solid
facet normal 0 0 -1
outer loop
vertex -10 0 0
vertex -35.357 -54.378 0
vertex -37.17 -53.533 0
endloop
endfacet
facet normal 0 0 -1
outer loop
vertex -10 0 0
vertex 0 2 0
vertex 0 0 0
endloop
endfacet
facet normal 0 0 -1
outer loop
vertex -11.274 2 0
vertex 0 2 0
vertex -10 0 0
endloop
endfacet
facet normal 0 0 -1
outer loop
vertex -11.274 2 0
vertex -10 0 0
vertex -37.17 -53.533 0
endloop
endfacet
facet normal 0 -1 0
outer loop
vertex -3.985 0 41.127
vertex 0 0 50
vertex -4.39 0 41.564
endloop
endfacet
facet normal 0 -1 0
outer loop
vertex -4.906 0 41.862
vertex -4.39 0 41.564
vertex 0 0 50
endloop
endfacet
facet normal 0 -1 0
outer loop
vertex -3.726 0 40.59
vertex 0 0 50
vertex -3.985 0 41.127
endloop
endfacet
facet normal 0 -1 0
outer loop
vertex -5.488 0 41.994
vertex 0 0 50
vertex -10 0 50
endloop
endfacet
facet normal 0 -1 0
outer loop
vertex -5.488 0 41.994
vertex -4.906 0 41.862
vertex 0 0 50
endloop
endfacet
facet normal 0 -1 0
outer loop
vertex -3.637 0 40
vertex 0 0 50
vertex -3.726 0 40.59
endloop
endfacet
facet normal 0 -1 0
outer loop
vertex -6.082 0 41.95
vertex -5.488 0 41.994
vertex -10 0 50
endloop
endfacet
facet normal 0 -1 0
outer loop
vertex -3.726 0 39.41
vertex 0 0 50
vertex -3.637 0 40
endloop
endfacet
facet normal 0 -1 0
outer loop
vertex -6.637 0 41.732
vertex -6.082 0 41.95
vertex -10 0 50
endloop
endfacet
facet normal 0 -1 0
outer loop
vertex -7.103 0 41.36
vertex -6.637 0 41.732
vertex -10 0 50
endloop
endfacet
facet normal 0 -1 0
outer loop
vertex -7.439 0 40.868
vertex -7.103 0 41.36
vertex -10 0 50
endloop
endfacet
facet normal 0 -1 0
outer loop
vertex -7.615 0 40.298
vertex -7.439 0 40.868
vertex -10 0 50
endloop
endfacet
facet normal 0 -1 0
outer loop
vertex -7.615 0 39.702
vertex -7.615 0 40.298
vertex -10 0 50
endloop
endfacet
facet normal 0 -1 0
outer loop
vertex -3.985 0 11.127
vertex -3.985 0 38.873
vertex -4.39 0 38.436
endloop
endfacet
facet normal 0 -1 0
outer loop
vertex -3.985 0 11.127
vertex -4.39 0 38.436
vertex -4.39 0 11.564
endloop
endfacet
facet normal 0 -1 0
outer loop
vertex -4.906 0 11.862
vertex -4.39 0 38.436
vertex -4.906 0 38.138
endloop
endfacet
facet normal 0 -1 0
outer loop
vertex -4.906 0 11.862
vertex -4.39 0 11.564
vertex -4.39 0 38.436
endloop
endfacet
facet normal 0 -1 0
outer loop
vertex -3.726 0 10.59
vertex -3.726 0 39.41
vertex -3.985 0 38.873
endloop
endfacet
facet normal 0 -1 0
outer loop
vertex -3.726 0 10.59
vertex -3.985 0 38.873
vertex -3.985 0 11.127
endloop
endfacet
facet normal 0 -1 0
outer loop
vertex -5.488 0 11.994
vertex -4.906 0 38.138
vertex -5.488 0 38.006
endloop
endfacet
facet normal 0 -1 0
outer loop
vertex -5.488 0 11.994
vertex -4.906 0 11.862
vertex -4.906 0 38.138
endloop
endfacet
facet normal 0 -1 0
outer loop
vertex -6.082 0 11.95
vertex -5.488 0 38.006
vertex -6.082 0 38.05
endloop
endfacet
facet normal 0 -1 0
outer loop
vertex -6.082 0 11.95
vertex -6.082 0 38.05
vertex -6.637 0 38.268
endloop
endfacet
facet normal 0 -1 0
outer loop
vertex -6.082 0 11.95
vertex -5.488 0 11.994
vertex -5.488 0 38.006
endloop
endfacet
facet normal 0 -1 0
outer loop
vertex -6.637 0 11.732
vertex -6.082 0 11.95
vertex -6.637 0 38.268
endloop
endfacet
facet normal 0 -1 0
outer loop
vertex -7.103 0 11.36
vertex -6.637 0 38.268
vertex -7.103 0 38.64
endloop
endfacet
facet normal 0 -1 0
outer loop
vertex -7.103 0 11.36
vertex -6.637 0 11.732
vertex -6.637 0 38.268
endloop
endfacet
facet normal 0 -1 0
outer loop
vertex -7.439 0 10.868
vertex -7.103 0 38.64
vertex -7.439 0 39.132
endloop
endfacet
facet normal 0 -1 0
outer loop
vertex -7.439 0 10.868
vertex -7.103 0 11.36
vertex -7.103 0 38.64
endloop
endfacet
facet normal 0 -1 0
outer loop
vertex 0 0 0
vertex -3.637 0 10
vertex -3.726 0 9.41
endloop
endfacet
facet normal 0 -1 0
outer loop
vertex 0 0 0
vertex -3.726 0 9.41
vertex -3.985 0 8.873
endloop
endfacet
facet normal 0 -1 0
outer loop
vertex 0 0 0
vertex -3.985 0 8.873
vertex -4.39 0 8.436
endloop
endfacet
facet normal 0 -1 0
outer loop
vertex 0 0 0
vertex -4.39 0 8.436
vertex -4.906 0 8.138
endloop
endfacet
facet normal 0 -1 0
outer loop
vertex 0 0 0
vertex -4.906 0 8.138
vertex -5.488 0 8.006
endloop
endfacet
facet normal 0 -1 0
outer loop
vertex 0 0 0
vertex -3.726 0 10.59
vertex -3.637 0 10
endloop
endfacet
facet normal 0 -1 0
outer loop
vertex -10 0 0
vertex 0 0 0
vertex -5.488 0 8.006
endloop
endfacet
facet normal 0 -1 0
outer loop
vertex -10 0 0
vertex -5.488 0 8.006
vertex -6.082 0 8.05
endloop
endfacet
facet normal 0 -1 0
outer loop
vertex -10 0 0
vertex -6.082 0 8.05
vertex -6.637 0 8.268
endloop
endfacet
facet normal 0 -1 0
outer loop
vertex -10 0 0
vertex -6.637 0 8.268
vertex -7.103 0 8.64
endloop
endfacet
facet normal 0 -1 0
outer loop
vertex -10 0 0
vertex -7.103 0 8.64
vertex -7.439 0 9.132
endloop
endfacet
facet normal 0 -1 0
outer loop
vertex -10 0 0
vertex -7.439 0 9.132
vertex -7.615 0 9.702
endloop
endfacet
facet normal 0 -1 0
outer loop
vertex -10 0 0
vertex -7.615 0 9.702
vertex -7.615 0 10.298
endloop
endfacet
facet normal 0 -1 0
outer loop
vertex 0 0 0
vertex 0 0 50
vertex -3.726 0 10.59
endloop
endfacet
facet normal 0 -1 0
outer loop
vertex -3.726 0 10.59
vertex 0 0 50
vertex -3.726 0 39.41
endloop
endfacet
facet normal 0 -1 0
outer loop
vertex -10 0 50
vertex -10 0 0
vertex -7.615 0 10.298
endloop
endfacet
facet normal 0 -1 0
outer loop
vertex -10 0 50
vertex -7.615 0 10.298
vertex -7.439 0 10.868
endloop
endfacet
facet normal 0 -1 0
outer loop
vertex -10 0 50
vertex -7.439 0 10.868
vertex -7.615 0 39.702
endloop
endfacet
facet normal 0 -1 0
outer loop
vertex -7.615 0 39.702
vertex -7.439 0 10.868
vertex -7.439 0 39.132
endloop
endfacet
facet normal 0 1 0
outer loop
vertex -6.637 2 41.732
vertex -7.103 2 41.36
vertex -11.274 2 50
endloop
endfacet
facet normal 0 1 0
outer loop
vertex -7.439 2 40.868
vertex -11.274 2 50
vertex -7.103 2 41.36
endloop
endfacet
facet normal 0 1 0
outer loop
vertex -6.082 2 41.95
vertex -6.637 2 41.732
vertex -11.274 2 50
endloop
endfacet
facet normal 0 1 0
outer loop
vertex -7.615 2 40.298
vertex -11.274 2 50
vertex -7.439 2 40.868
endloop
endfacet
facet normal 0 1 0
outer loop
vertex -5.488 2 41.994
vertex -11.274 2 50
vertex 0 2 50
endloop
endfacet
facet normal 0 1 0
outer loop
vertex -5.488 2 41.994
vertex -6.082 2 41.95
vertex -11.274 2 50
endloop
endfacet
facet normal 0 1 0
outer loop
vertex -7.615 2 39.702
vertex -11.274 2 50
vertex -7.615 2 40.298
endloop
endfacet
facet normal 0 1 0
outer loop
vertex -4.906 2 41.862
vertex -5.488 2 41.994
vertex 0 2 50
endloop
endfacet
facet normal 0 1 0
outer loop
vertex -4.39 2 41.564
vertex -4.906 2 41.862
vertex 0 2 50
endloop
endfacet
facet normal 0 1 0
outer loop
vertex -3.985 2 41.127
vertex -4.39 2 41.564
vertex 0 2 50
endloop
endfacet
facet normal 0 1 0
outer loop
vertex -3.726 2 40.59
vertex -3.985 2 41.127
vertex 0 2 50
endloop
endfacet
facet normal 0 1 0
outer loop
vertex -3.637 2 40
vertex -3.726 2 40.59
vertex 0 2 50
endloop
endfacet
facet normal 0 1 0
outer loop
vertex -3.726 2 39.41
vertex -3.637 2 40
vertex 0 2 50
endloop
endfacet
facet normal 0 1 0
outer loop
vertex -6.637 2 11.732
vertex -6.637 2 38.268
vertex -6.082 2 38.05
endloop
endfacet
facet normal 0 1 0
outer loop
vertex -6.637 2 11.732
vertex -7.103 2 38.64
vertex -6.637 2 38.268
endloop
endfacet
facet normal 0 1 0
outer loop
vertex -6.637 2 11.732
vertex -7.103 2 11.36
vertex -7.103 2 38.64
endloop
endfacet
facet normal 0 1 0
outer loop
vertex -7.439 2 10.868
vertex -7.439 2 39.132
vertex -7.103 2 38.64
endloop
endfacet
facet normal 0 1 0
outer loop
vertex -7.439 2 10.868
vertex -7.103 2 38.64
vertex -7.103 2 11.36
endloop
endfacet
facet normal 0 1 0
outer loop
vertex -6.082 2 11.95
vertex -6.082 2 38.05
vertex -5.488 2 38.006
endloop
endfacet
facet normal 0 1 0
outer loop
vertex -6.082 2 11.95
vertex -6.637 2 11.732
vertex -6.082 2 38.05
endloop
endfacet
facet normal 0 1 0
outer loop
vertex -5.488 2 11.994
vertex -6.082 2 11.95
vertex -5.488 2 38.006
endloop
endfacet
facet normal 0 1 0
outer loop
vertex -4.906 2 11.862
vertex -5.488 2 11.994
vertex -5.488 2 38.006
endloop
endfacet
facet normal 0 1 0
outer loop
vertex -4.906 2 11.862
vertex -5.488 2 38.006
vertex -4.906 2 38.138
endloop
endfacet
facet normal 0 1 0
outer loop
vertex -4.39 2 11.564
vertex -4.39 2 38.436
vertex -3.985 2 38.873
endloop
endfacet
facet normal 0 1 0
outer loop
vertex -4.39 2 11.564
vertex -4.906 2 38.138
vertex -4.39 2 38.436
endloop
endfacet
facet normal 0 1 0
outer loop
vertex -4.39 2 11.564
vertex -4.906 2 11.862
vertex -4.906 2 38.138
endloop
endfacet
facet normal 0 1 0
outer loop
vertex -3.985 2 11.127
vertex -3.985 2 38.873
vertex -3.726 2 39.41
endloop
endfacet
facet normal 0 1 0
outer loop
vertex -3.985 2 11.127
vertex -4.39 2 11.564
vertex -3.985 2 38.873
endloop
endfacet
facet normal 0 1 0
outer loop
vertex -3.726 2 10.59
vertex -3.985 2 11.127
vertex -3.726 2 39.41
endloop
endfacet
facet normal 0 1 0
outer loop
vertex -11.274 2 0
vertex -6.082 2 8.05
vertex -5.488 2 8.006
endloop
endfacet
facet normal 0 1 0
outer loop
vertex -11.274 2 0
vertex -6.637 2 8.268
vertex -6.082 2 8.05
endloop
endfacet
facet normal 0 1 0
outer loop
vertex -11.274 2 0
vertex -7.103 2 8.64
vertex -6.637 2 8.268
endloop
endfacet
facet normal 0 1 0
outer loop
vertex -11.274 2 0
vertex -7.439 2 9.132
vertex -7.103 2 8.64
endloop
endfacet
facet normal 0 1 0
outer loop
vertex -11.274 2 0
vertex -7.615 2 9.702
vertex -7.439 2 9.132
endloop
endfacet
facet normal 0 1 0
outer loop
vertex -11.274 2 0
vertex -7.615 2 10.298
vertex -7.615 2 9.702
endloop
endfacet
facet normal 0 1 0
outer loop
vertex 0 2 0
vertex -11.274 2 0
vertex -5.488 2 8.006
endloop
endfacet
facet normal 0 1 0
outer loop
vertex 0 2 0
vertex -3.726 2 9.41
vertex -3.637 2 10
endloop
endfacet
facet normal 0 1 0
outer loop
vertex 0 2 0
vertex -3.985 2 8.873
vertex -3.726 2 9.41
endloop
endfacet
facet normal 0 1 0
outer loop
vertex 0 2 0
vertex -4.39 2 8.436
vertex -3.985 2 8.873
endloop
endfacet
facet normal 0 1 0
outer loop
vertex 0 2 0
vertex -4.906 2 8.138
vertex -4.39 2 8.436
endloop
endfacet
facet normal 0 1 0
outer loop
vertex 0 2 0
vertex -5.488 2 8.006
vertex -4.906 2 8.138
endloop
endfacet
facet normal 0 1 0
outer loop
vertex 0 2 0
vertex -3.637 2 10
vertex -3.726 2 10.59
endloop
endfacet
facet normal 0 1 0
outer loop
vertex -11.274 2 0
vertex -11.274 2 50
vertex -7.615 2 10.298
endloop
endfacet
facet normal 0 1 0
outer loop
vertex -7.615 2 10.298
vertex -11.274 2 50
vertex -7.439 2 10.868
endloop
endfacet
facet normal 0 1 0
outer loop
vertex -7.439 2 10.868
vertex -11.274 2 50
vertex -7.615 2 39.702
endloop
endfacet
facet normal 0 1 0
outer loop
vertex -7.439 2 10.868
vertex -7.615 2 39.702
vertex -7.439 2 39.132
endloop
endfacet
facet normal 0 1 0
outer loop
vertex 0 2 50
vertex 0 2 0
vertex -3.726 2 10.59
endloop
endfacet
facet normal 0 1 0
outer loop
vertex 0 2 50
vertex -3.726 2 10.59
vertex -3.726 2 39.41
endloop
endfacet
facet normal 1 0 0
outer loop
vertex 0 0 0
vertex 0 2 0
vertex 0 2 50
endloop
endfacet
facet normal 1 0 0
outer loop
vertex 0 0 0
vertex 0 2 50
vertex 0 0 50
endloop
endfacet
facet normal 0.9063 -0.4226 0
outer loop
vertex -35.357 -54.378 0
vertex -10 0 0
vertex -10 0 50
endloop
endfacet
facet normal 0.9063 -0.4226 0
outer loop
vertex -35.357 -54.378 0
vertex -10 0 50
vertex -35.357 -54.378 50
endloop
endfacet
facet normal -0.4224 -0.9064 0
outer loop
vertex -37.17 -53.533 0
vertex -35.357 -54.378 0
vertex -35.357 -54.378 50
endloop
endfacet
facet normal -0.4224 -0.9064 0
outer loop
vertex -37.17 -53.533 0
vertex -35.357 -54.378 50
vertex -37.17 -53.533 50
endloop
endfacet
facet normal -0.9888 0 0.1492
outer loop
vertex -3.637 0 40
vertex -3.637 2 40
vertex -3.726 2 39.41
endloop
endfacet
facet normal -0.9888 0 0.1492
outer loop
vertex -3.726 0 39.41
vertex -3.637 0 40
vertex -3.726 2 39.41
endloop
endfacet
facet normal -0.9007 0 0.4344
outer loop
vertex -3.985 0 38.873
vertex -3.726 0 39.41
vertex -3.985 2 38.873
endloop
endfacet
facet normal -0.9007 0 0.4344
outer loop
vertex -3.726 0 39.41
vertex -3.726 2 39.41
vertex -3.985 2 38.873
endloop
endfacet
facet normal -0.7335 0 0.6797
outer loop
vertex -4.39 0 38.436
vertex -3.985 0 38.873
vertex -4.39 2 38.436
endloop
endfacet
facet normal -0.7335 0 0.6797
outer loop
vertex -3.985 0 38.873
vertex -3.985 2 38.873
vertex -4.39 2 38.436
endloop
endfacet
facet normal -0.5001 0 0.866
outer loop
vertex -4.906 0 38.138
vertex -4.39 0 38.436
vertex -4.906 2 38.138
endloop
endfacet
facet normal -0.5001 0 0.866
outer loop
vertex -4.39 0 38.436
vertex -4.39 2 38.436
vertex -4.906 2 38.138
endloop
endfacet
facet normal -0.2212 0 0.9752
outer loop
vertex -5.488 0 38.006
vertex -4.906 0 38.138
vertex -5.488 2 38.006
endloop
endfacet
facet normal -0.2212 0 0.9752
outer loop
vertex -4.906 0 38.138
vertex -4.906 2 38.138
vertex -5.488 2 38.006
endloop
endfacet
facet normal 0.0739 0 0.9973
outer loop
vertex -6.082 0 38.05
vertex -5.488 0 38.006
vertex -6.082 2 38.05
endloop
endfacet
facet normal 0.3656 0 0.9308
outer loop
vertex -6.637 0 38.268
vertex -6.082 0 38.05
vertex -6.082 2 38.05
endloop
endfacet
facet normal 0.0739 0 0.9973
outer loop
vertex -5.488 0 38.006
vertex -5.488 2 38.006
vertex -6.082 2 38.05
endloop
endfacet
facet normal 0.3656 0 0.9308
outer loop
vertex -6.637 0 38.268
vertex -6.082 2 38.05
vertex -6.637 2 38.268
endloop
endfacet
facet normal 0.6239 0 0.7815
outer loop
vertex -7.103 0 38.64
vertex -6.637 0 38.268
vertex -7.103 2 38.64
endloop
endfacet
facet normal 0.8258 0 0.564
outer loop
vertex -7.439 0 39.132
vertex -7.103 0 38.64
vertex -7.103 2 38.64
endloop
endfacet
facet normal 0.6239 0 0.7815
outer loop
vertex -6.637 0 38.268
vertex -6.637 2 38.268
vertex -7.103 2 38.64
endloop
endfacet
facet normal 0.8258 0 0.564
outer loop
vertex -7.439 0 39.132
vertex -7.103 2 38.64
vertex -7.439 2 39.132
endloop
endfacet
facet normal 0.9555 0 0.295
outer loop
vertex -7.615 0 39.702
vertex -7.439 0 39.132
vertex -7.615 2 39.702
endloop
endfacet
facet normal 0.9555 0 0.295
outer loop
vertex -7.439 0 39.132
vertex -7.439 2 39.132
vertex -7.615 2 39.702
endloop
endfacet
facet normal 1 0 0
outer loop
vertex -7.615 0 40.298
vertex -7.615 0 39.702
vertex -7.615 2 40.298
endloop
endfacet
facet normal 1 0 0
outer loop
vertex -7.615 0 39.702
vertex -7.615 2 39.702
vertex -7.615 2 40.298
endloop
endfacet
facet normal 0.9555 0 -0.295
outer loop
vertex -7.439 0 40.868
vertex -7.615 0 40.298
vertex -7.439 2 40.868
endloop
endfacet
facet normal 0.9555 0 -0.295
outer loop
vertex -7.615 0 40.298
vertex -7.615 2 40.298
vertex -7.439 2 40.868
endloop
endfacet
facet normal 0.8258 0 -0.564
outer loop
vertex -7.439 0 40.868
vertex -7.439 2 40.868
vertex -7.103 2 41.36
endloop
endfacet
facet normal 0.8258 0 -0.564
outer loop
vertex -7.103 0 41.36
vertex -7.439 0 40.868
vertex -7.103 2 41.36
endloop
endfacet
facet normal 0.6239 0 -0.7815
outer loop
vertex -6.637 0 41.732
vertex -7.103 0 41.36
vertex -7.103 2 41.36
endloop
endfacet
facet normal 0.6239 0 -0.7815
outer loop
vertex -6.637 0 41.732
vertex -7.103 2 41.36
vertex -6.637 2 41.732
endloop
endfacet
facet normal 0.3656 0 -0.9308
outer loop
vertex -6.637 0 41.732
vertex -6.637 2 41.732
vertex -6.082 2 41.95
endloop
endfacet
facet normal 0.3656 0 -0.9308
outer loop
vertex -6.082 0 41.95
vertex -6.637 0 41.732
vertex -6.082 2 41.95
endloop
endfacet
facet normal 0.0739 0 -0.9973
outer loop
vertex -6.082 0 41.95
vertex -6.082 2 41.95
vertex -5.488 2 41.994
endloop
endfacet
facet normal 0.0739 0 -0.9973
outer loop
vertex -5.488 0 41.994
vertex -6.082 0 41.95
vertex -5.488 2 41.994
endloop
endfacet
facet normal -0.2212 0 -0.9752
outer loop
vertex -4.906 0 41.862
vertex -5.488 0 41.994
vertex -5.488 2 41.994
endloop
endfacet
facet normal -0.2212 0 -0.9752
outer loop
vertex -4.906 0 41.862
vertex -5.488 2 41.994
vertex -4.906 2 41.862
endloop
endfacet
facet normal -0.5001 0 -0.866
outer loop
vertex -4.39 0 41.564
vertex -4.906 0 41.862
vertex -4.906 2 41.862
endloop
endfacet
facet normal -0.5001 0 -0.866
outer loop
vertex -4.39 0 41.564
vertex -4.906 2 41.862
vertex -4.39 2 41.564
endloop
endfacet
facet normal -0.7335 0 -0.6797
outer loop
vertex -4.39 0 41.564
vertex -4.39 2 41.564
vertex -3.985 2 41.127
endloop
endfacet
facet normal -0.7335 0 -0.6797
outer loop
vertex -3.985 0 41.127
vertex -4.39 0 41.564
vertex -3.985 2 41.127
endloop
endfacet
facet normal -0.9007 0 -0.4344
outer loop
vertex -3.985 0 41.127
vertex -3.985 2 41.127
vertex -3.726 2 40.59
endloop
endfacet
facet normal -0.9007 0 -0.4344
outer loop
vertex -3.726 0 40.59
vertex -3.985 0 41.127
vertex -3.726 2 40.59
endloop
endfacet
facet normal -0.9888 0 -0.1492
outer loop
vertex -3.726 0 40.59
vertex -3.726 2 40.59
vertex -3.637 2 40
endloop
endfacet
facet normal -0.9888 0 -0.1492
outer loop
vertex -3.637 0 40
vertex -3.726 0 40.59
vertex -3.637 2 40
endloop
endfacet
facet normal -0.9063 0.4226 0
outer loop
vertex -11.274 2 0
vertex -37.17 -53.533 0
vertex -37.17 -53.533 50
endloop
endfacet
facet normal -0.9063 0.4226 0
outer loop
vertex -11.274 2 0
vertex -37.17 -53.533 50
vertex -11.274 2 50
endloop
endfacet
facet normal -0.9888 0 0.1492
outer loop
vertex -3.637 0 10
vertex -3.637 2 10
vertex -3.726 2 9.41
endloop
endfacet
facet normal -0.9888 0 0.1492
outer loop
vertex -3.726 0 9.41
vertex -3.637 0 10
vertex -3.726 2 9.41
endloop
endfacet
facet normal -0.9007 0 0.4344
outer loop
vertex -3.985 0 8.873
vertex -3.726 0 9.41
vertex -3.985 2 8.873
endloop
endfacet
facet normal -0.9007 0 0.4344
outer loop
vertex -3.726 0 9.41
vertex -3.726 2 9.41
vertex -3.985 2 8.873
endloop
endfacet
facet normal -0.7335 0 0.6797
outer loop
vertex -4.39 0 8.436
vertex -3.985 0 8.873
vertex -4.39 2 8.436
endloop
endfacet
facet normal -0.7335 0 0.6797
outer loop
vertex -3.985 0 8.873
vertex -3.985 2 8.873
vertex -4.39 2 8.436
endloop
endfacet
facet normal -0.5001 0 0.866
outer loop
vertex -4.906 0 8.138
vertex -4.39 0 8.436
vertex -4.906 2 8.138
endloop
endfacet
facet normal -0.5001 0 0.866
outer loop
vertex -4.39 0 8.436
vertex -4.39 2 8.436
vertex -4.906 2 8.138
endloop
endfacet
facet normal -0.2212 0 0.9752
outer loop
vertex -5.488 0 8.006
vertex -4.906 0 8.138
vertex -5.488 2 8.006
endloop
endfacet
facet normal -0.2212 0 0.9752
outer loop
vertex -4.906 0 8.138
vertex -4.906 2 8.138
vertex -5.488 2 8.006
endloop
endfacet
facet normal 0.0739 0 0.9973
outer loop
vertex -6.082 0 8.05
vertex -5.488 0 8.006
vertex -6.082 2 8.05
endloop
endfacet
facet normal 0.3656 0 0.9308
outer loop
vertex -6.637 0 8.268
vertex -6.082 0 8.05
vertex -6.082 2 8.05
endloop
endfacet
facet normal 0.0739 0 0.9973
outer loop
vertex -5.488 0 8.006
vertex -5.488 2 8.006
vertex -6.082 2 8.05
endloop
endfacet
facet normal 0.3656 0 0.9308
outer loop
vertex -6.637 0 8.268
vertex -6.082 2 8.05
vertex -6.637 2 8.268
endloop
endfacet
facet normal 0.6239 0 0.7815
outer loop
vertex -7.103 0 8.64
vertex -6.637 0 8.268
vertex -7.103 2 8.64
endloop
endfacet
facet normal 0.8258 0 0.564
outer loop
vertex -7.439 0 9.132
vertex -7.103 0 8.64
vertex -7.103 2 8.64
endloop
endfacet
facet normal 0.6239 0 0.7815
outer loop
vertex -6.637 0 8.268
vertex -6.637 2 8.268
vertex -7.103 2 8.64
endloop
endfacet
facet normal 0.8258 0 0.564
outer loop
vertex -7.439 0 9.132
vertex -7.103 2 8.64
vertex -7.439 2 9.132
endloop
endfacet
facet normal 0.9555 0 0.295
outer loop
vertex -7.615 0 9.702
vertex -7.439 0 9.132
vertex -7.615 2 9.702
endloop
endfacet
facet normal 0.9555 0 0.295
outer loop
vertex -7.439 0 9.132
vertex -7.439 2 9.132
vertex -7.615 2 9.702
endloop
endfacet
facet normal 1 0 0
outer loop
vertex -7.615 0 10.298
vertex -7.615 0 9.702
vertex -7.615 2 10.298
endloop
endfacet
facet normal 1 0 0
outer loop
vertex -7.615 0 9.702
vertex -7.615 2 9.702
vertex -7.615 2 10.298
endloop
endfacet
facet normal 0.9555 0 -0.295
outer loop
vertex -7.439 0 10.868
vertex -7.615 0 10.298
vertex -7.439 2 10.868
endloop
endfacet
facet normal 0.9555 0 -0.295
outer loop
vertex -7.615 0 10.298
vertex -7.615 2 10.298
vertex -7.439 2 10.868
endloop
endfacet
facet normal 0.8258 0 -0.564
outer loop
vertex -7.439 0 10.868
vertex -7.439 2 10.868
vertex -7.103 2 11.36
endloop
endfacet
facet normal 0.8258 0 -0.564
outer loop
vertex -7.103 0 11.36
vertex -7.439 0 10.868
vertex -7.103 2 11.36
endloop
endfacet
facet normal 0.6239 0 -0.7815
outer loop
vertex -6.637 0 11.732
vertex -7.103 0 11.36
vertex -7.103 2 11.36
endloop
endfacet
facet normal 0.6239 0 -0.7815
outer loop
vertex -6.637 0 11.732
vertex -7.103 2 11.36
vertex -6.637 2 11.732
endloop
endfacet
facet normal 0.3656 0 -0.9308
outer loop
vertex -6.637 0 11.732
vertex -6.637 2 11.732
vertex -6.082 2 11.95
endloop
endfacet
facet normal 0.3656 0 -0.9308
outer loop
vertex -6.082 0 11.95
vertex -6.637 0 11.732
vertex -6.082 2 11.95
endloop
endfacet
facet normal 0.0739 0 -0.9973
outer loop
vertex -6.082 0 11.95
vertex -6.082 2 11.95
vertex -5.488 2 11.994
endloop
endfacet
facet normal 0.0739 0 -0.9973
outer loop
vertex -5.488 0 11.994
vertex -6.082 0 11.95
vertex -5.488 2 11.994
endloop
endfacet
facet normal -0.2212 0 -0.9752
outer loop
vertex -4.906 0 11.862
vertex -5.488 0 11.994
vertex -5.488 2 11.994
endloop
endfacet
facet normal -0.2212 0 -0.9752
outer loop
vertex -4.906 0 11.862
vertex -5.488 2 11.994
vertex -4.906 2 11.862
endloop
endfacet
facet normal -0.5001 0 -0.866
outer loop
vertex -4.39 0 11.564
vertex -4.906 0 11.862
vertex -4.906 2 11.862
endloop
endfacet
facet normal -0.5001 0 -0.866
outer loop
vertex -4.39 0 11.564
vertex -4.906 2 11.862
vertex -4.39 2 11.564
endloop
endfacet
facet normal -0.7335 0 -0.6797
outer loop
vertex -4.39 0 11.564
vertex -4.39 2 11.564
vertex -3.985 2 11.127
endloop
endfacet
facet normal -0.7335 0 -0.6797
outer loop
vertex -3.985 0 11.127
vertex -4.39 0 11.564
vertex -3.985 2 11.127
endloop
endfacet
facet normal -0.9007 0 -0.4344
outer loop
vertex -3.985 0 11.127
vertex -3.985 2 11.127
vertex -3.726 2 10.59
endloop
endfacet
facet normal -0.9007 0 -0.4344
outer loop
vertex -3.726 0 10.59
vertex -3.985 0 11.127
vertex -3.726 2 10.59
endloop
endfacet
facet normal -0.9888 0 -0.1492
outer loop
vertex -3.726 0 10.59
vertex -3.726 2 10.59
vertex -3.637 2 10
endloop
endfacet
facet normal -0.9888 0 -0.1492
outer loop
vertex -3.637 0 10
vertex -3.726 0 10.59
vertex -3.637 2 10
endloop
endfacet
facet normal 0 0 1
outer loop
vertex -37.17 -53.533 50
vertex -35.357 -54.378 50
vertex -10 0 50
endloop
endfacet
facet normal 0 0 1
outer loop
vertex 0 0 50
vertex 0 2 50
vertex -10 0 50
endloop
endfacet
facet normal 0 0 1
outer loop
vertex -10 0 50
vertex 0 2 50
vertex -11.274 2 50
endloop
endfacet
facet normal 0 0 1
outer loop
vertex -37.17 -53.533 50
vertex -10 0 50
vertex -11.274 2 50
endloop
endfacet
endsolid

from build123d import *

# Parameters (mm, degrees)
BOSS_EXTRUDE1_DEPTH = 50
CUT_EXTRUDE1_REACH  = 58.378
SKETCH2_R           = 2


with BuildPart() as part:
    # Sketch1 → Boss-Extrude1 (new body)
    with BuildSketch(Plane.XY):
        Polygon((0, 0), (-10, 0), (-35.357095704, -54.378467222), (-37.169711279, -53.533230699), (-11.274140522, 2), (0, 2), align=None)
    extrude(amount=BOSS_EXTRUDE1_DEPTH)

    # Sketch2 → Cut-Extrude1 (cut, up to next)
    with BuildSketch(Plane(origin=(0, 2, 0), x_dir=(1, 0, 0), z_dir=(0, 1, 0)), mode=Mode.PRIVATE) as cut_extrude1_sk1:
        with Locations((-5.637070261, -10)):
            Circle(SKETCH2_R)
    cut_extrude1_tool1 = extrude(cut_extrude1_sk1.sketch, amount=-CUT_EXTRUDE1_REACH, mode=Mode.PRIVATE) & part.part
    add(cut_extrude1_tool1.solids().sort_by_distance((-5.63707, 2, 10))[0], mode=Mode.SUBTRACT)
    # Sketch2 → Cut-Extrude1 (cut, up to next)
    with BuildSketch(Plane(origin=(0, 2, 0), x_dir=(1, 0, 0), z_dir=(0, 1, 0)), mode=Mode.PRIVATE) as cut_extrude1_sk2:
        with Locations((-5.637070261, -40)):
            Circle(SKETCH2_R)
    cut_extrude1_tool2 = extrude(cut_extrude1_sk2.sketch, amount=-CUT_EXTRUDE1_REACH, mode=Mode.PRIVATE) & part.part
    add(cut_extrude1_tool2.solids().sort_by_distance((-5.63707, 2, 40))[0], mode=Mode.SUBTRACT)


solid = part.part
